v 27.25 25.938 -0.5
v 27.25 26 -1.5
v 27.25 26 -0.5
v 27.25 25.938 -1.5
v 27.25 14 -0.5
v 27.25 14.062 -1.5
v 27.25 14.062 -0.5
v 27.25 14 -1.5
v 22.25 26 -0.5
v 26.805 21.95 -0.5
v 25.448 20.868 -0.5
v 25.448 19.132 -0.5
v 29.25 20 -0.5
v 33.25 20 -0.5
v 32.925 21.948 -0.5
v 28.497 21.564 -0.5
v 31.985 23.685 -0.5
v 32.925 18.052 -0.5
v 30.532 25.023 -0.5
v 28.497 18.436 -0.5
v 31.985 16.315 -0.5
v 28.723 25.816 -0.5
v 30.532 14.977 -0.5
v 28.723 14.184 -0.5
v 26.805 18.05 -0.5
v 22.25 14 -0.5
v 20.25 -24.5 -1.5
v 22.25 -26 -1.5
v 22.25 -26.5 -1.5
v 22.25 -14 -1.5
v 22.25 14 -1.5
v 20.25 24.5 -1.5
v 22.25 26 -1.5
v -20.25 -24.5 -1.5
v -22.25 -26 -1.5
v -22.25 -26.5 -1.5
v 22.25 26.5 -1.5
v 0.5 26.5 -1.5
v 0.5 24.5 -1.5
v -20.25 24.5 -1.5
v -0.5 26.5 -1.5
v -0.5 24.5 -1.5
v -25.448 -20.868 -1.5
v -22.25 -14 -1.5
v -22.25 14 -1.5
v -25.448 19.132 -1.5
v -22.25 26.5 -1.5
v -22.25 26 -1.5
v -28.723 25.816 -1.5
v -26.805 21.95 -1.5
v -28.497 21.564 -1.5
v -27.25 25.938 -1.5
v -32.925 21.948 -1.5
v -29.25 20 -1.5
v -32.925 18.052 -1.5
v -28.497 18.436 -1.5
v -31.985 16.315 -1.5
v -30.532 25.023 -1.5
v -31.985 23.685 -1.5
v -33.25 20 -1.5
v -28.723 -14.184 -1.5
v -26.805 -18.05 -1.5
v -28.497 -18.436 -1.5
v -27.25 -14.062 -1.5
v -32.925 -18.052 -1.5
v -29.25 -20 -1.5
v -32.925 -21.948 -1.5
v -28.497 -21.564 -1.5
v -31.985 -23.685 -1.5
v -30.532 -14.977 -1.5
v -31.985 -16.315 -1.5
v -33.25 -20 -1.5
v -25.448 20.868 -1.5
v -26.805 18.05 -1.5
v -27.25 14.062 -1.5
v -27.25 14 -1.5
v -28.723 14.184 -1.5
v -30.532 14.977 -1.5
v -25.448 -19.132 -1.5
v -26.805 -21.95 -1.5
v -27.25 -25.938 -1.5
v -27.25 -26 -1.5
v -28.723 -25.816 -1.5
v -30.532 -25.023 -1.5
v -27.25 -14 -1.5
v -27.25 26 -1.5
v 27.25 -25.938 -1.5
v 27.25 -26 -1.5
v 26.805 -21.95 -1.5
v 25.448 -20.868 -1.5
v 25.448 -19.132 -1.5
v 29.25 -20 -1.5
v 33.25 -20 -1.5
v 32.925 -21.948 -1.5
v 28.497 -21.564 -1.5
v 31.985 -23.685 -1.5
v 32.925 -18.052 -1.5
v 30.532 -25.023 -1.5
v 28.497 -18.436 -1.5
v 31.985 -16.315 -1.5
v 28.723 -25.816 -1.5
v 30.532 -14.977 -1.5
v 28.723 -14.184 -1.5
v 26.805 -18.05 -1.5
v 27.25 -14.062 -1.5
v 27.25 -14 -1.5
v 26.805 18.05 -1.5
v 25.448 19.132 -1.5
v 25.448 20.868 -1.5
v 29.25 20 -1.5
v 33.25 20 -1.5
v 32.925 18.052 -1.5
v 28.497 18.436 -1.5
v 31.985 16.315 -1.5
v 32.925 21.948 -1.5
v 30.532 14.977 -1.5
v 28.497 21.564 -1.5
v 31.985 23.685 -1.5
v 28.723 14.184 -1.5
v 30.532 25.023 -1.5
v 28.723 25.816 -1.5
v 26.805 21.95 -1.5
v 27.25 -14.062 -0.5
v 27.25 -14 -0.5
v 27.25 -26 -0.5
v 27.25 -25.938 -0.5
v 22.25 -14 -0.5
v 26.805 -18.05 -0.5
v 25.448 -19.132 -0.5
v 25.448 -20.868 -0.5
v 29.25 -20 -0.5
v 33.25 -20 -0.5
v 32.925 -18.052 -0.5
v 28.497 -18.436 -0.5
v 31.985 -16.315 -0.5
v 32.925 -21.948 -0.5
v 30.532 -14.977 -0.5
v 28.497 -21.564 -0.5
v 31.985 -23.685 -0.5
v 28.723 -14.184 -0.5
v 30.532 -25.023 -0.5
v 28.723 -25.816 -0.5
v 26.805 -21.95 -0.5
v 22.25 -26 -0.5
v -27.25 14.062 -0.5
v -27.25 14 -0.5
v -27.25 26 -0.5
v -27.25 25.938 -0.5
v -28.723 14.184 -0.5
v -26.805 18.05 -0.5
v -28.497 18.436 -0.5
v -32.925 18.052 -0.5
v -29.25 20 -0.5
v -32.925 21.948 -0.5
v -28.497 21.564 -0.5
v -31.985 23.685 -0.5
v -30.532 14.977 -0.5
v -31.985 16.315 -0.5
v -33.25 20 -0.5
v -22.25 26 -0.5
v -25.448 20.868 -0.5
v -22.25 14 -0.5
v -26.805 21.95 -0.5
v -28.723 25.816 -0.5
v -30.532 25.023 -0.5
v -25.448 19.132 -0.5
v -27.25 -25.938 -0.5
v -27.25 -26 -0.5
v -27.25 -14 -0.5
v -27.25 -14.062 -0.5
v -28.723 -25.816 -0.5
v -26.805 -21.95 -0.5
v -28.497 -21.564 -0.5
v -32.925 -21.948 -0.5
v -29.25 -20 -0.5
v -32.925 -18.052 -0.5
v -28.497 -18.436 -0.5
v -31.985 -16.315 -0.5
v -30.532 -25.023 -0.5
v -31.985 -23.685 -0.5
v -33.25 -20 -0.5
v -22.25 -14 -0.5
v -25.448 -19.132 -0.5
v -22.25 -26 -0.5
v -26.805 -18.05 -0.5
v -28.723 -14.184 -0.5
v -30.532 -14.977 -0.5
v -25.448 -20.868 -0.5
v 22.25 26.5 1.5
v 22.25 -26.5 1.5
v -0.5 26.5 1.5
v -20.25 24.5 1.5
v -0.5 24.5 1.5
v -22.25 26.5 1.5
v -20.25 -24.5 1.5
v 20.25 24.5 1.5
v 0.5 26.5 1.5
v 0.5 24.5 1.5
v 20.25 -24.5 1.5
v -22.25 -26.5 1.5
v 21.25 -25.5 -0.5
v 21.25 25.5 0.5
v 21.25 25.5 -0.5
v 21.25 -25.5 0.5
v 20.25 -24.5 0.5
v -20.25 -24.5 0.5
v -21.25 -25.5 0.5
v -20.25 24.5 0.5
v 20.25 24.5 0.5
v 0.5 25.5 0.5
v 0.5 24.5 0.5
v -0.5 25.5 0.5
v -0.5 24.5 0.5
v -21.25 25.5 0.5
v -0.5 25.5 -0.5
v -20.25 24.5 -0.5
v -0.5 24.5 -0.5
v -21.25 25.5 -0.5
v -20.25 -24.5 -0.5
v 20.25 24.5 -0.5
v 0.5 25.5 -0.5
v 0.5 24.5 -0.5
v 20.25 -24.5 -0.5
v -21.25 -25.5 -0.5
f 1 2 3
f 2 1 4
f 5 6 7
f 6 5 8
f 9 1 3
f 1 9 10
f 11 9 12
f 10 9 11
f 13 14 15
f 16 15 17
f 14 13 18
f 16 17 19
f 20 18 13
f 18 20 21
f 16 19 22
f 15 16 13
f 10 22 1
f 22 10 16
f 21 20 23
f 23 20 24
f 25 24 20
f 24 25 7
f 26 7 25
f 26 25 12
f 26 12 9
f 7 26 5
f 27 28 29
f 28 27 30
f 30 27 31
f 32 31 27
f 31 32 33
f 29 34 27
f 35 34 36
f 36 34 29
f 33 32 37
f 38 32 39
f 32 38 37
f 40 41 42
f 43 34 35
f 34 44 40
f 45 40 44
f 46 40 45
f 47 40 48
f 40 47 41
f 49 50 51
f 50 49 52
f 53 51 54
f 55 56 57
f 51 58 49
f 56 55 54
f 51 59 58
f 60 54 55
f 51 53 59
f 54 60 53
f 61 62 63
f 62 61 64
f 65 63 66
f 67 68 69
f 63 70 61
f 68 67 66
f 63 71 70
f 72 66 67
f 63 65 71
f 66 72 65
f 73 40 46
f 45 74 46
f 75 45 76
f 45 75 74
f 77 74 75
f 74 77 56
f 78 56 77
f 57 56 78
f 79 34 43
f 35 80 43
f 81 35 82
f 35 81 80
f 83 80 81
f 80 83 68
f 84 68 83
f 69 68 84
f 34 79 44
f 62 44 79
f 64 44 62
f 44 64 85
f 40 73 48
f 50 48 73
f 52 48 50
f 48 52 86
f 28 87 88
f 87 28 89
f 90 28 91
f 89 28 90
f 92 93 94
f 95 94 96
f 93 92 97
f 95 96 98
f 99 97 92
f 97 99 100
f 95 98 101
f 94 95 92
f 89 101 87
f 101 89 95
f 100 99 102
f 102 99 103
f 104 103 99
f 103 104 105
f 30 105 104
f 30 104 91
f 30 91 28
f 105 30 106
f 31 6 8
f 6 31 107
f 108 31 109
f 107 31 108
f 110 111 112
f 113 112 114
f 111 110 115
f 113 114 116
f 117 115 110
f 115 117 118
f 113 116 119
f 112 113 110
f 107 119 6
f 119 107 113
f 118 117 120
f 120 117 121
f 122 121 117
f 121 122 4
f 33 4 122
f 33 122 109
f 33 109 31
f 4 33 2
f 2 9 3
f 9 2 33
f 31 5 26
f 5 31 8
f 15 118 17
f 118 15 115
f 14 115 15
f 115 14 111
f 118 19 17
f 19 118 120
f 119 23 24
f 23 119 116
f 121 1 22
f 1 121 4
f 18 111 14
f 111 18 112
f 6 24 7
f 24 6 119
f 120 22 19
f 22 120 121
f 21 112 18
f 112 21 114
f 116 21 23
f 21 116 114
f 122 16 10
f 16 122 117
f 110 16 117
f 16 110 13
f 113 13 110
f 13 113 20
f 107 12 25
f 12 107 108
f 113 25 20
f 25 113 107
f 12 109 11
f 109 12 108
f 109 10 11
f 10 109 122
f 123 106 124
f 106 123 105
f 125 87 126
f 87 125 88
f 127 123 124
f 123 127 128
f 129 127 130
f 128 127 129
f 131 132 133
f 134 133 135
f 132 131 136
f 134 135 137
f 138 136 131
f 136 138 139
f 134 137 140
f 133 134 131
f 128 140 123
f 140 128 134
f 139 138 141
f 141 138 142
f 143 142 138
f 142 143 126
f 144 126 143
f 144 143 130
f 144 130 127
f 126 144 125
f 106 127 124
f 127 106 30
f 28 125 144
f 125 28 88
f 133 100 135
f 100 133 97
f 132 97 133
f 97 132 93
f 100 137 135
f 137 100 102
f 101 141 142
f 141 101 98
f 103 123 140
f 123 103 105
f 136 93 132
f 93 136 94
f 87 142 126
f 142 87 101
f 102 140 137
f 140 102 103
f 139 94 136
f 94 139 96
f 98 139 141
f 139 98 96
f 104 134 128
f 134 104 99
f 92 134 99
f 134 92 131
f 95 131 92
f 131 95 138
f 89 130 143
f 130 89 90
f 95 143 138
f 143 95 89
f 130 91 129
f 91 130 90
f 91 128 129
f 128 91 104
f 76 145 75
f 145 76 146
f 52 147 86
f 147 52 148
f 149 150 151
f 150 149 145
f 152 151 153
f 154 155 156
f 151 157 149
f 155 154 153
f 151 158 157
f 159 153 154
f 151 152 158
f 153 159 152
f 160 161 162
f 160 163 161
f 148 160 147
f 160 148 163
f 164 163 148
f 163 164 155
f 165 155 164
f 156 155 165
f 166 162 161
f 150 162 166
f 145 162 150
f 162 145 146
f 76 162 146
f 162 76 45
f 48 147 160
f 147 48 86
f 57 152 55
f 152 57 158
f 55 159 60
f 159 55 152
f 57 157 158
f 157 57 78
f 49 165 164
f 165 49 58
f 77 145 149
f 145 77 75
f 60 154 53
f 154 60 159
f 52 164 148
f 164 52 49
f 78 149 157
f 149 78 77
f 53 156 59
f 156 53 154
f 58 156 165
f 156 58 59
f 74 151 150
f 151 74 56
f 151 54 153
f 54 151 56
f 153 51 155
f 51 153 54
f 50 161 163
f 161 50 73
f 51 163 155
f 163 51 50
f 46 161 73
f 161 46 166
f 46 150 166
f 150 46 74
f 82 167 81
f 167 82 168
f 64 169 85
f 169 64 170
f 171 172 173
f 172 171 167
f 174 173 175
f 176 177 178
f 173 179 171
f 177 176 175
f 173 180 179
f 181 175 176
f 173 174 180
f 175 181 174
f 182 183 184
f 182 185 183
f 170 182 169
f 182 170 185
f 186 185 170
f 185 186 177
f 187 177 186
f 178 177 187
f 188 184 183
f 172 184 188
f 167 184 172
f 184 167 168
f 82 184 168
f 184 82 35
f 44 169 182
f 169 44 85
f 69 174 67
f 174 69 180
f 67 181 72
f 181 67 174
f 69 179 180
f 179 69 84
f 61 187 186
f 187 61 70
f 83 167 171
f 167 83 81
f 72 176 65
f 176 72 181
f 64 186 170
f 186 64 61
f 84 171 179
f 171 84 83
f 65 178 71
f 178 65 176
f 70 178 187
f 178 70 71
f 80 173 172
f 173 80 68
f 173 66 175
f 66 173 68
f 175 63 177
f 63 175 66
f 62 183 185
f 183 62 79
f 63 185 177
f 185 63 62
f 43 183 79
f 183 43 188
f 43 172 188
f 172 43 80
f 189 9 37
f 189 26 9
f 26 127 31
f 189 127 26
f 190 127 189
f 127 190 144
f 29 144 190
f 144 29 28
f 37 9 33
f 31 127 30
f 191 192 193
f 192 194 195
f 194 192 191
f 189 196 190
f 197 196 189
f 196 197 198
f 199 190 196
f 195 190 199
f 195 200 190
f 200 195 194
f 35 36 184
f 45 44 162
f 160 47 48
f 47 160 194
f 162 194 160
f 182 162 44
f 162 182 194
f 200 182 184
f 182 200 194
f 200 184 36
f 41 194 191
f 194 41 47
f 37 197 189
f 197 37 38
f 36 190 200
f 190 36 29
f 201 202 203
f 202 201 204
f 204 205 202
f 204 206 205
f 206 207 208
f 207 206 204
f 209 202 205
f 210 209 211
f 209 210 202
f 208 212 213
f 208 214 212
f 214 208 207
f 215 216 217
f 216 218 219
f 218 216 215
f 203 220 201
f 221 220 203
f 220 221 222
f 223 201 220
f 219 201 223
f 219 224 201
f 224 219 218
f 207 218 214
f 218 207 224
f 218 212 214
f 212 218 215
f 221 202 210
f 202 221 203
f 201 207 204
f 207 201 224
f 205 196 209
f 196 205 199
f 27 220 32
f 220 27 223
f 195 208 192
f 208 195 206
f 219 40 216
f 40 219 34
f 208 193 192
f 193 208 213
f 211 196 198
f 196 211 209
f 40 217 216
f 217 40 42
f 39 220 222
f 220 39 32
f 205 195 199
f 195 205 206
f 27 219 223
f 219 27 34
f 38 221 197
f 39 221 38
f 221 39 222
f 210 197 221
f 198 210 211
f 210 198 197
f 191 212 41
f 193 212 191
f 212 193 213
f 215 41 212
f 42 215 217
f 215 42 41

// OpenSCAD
PCB_LENGTH = 51;
PCB_WIDTH = 42.5;
PCB_HEIGHT = 1;
BORDER = 1;

module tab() {
 difference() {
  union() {
    translate([3,0,0]) cube([6,12,BORDER], center=true);
    translate([6,0,0]) cylinder(r=6,h=BORDER,center=true);
  }
  translate([6,0,0]) cylinder(r=2,h=BORDER*3,center=true);  
 }
}

TABX = PCB_WIDTH/2;
TABY = 20;
TABZ = -(BORDER/2 + PCB_HEIGHT/2);
union() {
 difference() {
  union() {
    cube([PCB_WIDTH+BORDER*2,PCB_LENGTH+BORDER*2,PCB_HEIGHT+BORDER*2], center=true);  
    translate([TABX,TABY,TABZ]) tab();
    translate([TABX,-TABY,TABZ]) tab();
    translate([-TABX,TABY,TABZ]) rotate([0,0,180]) tab();
    translate([-TABX,-TABY,TABZ]) rotate([0,0,180]) tab();
  }
  union() {
    cube([PCB_WIDTH,PCB_LENGTH,PCB_HEIGHT], center=true); // PCB
    cube([PCB_WIDTH-BORDER*2,PCB_LENGTH-BORDER*2,PCB_HEIGHT+BORDER*4], center=true); // PCB cutout
    translate([0,PCB_LENGTH/2,0])  cube([BORDER,BORDER*8,PCB_HEIGHT+BORDER*4], center=true); // opening cutout
  }
 }
}
